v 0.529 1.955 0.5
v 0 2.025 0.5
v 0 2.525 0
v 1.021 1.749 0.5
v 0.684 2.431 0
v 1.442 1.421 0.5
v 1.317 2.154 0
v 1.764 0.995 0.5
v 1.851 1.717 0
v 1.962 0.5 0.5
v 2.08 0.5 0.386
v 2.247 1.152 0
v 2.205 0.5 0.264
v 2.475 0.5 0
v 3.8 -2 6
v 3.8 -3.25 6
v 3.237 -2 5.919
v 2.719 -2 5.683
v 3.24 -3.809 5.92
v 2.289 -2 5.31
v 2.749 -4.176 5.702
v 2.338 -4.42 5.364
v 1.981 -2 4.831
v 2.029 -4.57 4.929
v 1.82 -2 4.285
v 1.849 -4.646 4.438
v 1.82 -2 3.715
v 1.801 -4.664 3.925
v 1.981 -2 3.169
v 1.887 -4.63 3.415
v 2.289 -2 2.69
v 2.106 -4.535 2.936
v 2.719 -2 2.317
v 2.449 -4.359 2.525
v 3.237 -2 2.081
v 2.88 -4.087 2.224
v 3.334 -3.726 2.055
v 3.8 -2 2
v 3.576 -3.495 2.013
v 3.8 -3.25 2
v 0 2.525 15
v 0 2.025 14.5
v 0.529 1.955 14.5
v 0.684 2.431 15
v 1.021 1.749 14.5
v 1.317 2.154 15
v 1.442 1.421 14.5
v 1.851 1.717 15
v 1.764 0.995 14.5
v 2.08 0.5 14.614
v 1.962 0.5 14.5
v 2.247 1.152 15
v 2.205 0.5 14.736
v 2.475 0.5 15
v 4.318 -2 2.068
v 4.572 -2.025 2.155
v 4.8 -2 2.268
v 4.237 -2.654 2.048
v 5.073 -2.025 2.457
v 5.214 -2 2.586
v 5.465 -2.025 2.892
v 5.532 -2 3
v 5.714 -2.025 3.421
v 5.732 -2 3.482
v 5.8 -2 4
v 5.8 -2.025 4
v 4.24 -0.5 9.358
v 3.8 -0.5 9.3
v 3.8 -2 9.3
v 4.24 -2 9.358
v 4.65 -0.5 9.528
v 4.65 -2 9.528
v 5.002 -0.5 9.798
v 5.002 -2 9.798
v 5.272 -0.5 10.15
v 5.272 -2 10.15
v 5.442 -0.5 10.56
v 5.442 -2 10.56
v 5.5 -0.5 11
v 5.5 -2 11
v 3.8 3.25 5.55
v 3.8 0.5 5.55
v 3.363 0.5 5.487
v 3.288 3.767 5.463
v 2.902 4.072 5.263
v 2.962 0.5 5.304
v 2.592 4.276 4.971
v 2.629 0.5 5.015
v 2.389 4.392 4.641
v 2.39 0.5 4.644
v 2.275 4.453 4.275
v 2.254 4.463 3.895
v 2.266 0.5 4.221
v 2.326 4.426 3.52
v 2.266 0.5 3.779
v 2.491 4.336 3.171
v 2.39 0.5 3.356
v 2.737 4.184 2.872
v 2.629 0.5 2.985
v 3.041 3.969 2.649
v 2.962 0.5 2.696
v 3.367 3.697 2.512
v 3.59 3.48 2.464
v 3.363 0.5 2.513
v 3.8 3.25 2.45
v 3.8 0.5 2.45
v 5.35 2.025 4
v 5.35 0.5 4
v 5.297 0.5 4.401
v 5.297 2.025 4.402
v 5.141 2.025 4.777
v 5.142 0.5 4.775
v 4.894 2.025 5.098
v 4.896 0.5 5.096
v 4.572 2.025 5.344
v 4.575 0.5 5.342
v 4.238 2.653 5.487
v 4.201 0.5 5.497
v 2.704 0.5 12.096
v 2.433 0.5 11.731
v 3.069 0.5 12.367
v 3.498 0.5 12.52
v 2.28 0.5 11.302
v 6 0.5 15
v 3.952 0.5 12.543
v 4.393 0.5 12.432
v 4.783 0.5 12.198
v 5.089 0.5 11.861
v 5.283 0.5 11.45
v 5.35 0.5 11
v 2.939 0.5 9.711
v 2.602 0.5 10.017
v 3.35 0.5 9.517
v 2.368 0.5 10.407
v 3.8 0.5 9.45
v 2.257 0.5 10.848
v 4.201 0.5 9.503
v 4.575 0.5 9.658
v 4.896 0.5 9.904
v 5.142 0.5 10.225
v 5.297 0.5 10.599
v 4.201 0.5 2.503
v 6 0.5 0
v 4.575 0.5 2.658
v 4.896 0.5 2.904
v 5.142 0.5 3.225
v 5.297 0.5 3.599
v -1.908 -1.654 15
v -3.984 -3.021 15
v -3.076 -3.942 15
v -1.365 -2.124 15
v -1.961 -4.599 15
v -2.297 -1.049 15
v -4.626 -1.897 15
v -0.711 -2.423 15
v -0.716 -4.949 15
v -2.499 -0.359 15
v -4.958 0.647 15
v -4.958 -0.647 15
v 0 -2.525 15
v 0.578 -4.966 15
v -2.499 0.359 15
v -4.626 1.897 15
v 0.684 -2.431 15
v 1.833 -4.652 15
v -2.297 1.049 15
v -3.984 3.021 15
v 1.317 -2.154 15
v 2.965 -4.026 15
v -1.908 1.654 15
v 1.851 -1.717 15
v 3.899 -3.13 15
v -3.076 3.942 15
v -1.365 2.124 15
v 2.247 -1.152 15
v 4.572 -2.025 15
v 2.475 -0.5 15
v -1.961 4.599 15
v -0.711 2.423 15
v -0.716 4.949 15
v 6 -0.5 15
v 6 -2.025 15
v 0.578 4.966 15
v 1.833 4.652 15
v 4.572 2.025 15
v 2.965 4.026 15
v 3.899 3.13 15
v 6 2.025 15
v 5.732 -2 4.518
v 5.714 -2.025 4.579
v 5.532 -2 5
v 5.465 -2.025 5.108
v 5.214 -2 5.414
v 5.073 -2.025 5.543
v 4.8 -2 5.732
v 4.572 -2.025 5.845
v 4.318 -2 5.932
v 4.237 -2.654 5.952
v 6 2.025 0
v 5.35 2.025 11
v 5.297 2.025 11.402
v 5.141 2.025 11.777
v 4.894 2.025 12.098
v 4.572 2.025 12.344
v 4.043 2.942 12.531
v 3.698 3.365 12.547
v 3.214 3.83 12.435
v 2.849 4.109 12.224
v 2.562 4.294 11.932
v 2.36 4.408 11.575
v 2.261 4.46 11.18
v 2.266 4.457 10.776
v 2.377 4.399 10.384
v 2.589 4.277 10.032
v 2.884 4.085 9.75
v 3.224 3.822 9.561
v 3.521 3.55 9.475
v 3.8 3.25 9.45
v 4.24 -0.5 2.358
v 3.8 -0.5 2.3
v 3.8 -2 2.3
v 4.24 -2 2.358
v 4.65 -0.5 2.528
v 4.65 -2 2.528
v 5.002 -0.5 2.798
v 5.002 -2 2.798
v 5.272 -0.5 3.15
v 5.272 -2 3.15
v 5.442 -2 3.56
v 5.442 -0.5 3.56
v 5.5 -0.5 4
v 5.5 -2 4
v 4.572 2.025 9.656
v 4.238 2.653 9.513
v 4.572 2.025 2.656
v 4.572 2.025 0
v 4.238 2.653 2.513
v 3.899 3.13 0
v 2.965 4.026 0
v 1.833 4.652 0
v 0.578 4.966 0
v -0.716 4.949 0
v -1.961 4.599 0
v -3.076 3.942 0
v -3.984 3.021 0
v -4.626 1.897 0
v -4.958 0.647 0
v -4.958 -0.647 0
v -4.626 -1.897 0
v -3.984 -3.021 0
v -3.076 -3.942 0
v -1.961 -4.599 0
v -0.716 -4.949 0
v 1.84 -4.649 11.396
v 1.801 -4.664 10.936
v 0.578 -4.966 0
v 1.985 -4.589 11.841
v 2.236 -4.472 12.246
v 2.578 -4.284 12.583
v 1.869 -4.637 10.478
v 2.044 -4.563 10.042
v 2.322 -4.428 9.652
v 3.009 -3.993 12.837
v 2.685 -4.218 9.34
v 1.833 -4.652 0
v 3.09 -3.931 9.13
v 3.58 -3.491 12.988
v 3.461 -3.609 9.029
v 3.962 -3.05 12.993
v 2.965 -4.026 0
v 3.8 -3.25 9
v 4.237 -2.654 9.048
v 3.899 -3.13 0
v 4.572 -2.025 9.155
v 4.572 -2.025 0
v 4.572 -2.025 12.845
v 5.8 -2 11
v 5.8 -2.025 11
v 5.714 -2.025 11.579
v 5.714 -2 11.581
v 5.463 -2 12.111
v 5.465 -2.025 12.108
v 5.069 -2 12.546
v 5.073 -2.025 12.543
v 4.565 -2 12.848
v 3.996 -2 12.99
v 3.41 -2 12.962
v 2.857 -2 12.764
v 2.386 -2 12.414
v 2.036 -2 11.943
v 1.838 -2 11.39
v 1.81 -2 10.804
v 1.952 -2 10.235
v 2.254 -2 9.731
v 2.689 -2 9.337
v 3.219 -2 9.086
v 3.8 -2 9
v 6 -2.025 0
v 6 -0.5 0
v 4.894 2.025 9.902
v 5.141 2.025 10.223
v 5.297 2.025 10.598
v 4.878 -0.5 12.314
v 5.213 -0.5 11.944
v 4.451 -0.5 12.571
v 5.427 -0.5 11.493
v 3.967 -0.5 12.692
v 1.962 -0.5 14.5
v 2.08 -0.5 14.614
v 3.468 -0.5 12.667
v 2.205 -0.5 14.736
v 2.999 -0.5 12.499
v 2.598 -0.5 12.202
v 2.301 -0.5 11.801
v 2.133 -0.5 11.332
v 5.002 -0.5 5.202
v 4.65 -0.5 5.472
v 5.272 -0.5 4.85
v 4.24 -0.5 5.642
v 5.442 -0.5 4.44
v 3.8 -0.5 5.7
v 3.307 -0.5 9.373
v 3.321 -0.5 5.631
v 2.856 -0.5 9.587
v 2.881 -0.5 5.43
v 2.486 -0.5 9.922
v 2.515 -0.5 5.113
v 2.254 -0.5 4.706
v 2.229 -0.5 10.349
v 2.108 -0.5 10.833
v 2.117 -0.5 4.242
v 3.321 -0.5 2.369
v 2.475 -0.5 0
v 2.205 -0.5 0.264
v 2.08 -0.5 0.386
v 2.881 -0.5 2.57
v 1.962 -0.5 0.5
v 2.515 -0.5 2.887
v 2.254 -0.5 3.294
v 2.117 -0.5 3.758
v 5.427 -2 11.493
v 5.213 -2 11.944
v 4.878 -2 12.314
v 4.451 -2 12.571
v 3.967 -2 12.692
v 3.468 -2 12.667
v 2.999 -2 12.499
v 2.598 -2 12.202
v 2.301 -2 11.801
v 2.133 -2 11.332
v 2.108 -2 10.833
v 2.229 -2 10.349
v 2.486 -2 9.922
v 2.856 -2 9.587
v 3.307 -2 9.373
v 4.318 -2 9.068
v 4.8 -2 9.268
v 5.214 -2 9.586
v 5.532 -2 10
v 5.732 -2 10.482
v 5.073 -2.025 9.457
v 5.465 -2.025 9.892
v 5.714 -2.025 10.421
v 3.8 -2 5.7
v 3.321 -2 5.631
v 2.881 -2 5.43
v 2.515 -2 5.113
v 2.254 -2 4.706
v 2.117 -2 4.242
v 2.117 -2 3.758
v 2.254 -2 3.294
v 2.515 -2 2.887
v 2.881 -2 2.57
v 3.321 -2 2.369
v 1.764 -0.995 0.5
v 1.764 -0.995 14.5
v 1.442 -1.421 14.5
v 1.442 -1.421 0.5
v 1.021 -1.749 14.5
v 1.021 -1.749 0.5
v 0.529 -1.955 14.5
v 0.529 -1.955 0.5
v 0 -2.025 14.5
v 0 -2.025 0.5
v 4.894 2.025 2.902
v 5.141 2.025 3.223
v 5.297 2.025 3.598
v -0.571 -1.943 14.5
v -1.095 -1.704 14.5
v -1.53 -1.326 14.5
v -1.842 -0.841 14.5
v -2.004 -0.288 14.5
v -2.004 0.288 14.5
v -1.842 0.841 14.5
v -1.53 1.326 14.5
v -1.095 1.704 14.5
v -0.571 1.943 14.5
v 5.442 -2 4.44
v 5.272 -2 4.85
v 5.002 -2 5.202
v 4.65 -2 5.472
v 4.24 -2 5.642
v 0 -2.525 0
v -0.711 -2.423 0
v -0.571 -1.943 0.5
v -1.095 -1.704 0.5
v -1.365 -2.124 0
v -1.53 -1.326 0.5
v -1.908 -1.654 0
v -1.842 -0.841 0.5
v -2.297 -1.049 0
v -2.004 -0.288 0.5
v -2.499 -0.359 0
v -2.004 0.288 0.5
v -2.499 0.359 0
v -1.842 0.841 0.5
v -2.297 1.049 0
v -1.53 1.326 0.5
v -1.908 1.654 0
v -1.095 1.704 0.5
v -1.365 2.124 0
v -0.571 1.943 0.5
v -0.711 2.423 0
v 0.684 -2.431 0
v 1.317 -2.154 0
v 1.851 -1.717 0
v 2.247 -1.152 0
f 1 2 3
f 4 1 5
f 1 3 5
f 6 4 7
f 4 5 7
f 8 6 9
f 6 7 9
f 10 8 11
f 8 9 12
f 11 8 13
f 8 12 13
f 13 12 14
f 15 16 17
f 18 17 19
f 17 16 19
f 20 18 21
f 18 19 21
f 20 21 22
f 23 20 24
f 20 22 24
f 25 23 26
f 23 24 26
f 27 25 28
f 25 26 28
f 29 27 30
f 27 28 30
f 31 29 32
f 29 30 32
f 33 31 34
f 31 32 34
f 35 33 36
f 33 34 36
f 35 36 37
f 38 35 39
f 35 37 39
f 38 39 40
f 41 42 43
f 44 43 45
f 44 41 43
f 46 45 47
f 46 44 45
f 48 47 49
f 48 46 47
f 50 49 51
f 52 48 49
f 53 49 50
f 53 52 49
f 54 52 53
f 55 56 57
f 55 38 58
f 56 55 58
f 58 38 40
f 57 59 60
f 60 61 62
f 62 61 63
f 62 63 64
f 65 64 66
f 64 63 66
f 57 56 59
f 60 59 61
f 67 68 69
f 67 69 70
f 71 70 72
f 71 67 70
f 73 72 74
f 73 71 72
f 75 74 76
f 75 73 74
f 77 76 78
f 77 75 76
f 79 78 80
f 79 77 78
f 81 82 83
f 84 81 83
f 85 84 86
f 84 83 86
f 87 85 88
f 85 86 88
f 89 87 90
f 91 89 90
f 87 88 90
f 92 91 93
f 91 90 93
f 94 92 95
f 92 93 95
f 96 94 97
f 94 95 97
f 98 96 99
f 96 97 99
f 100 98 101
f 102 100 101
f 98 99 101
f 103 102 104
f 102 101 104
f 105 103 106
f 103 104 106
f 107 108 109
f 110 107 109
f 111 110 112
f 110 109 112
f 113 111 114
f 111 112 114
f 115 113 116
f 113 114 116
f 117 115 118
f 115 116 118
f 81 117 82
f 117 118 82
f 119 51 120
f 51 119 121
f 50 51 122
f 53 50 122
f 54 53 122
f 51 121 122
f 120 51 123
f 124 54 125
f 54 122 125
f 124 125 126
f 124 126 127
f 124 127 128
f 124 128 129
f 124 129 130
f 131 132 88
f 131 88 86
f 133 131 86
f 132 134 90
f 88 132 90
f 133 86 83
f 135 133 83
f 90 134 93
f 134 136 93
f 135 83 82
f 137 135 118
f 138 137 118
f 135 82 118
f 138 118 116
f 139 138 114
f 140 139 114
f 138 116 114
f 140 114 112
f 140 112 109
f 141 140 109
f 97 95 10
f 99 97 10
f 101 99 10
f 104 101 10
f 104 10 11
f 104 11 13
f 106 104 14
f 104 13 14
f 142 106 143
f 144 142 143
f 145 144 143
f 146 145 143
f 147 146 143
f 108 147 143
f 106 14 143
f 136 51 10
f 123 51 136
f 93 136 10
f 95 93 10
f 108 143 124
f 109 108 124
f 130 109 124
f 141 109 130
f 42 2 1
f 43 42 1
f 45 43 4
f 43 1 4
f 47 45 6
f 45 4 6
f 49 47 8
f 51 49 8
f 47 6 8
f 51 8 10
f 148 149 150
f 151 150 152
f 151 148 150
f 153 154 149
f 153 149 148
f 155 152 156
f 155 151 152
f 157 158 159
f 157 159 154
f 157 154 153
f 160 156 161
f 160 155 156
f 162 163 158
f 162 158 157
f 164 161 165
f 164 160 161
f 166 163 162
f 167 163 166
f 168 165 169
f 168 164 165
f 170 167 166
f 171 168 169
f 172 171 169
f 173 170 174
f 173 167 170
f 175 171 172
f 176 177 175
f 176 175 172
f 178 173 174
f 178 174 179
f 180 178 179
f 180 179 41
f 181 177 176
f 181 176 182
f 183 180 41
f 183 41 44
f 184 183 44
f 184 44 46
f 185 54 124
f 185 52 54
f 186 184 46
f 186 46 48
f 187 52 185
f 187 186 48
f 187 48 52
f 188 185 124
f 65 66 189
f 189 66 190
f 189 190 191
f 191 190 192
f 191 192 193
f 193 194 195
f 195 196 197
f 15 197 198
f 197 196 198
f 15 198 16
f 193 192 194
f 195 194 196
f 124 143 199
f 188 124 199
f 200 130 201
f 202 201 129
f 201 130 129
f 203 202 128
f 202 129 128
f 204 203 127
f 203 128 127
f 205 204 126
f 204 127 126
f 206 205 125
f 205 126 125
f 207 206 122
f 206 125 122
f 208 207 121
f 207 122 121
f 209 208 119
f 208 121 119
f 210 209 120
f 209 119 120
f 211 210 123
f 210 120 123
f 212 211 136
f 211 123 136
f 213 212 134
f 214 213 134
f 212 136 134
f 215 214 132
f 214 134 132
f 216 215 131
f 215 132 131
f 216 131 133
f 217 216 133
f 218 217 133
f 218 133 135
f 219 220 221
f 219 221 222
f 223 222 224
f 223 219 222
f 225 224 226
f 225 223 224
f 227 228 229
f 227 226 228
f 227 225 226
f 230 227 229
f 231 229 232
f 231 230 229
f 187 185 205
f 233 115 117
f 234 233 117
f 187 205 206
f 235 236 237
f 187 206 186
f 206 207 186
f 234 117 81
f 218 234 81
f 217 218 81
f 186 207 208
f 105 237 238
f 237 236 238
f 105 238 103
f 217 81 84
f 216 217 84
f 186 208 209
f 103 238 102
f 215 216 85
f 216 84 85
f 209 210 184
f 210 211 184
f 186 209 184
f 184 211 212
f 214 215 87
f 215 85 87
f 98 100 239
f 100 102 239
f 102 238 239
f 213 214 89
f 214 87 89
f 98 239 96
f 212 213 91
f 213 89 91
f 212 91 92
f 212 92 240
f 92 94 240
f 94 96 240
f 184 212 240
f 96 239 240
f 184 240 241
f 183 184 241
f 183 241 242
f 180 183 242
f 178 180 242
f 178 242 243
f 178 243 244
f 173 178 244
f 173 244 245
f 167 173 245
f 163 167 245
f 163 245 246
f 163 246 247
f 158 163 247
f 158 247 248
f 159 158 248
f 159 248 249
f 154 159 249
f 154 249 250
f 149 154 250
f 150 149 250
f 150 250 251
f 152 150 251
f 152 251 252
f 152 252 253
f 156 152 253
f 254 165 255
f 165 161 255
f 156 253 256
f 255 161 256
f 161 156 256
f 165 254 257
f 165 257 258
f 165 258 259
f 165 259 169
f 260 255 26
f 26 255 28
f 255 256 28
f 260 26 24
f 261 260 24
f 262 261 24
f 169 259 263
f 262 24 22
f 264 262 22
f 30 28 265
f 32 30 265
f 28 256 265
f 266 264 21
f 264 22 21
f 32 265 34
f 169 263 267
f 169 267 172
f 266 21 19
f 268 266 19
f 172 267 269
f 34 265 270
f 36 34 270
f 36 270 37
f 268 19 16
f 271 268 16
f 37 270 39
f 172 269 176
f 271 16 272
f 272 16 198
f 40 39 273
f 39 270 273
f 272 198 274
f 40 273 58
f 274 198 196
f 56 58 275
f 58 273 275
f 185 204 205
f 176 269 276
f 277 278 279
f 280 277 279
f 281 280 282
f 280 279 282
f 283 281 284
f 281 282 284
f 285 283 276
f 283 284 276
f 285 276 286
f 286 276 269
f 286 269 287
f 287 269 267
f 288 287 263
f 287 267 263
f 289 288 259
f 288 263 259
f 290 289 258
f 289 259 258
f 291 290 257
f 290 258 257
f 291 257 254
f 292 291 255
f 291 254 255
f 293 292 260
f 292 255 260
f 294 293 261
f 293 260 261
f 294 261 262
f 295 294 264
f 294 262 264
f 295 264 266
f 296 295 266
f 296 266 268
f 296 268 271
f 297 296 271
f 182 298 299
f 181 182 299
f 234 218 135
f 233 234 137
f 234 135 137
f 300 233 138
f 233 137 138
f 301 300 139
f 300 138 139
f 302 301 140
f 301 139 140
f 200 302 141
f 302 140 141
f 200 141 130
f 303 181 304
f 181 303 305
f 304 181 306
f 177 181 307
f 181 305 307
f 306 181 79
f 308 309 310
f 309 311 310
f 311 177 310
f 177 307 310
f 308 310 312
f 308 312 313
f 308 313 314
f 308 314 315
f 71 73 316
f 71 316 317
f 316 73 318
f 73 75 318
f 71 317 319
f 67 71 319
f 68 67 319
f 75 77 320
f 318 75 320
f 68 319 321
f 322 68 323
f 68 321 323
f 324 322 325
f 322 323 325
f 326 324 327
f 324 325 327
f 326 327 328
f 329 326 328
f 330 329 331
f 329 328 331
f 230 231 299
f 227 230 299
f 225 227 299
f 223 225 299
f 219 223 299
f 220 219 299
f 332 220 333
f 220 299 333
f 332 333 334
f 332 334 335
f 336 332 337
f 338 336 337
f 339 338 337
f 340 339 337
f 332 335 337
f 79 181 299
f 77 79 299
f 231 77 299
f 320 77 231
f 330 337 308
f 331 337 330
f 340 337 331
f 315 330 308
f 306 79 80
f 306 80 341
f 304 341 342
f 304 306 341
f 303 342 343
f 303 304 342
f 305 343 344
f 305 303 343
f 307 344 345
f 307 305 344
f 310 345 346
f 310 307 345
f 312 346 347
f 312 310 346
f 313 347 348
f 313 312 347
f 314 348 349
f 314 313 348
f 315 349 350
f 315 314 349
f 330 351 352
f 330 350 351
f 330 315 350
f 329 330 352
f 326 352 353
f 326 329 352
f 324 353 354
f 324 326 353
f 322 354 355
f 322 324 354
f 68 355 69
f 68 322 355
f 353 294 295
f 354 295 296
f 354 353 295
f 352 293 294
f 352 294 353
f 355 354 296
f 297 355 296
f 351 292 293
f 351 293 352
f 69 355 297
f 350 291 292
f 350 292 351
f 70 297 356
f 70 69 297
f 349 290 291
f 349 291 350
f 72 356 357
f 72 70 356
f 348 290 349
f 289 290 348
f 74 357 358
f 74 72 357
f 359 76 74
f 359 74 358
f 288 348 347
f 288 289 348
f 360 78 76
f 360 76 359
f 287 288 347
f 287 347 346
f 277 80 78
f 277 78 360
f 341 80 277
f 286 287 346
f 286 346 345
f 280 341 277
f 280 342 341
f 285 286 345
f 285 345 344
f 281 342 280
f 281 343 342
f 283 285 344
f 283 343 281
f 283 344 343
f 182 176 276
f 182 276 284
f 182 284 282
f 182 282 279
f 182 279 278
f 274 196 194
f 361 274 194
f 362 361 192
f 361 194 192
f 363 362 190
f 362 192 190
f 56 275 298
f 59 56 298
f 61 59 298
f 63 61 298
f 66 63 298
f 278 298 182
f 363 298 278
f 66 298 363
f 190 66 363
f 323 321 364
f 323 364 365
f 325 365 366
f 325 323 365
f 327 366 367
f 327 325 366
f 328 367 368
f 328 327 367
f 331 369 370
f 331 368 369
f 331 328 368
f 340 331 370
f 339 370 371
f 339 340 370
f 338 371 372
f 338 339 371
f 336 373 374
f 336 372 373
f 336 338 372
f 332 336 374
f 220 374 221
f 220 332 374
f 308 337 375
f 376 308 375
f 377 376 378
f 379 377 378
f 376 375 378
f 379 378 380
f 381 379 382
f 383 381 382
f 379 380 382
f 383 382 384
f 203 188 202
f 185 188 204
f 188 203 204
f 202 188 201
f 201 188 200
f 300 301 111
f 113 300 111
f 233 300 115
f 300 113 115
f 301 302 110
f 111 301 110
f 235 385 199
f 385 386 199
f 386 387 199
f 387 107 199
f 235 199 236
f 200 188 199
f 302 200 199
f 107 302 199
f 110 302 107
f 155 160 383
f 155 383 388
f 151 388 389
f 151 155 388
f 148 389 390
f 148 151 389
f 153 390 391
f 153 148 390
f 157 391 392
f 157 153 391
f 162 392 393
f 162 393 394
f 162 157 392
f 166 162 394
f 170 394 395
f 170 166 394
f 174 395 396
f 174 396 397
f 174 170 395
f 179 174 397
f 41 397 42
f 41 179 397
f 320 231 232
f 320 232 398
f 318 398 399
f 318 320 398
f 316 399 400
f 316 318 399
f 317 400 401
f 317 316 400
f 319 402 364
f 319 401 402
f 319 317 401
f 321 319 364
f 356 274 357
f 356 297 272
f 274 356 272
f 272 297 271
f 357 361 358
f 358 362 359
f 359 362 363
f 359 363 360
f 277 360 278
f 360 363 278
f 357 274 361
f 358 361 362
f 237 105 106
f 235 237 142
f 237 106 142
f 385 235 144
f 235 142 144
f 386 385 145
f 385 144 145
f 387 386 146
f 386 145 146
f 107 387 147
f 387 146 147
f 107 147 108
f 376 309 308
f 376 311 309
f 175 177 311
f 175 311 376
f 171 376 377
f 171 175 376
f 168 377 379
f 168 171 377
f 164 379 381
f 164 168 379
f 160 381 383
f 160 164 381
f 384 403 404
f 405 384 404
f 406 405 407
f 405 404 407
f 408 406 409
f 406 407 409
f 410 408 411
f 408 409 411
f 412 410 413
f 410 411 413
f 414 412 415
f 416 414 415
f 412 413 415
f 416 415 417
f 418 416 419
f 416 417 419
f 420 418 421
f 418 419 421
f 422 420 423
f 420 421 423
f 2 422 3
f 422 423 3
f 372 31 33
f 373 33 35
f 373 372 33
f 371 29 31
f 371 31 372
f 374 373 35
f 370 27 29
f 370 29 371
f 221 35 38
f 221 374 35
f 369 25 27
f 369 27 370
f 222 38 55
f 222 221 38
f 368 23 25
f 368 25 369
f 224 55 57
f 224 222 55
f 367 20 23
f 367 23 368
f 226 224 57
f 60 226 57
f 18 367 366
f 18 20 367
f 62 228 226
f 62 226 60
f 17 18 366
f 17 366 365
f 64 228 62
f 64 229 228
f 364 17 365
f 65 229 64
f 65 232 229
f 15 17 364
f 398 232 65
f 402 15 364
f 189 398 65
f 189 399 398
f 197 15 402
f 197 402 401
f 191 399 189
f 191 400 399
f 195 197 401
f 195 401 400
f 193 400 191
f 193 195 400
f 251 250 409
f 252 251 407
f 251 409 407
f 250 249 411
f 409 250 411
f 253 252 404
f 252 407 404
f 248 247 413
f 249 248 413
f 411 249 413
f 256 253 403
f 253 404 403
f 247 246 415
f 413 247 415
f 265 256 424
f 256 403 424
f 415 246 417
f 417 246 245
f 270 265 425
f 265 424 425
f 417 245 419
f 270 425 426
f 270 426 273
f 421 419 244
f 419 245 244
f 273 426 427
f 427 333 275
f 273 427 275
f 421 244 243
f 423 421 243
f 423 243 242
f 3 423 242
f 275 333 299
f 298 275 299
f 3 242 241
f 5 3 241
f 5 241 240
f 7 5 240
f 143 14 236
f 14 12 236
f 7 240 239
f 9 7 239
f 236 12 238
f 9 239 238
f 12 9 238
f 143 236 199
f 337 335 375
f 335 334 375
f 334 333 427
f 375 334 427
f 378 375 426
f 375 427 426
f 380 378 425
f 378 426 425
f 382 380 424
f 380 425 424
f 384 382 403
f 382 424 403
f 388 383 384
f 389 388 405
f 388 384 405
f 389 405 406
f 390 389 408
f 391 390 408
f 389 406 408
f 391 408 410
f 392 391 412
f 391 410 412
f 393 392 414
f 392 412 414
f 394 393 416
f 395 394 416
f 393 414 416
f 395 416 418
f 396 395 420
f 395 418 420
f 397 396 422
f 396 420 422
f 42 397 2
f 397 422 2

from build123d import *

# Parameters (mm, degrees)
F2_DEPTH = 15
F3_DEPTH = 5
F4_DEPTH = 5
F7_DEPTH = 3
F8_SIZE  = 0.5


with BuildPart() as f2:
    # F0 (on Top) → F2 (new body)
    with BuildSketch(Plane.XY):
        with BuildLine():
            ThreePointArc((0, -2.025), (-2.025, 0), (0, 2.025))
            Line((0, 2.025), (4.5715834237, 2.025))
            ThreePointArc((4.5715834237, 2.025), (-5, 0), (4.5715834237, -2.025))
            Line((4.5715834237, -2.025), (0, -2.025))
        make_face()
        with BuildLine():
            Line((4.5715834237, 2.025), (0, 2.025))
            ThreePointArc((0, 2.025), (1.2426031144, 1.5989254204), (1.9623009453, 0.5))
            Line((1.9623009453, 0.5), (4.9749371855, 0.5))
            ThreePointArc((4.9749371855, 0.5), (4.8337790791, 1.2785068691), (4.5715834237, 2.025))
        make_face()
        with BuildLine():
            ThreePointArc((1.9623009453, -0.5), (1.2426031144, -1.5989254204), (0, -2.025))
            Line((0, -2.025), (4.5715834237, -2.025))
            ThreePointArc((4.5715834237, -2.025), (4.8337790791, -1.2785068691), (4.9749371855, -0.5))
            Line((4.9749371855, -0.5), (1.9623009453, -0.5))
        make_face()
        with BuildLine():
            Line((6, 2.025), (4.5715834237, 2.025))
            ThreePointArc((4.5715834237, 2.025), (4.8337790791, 1.2785068691), (4.9749371855, 0.5))
            Line((4.9749371855, 0.5), (5.5474806577, 0.5))
            Line((5.5474806577, 0.5), (6, 0.5))
            Line((6, 0.5), (6, 2.025))
        make_face()
        with BuildLine():
            ThreePointArc((4.9749371855, -0.5), (4.8337790791, -1.2785068691), (4.5715834237, -2.025))
            Line((4.5715834237, -2.025), (6, -2.025))
            Line((6, -2.025), (6, -0.5))
            Line((6, -0.5), (5.5474806577, -0.5))
            Line((5.5474806577, -0.5), (4.9749371855, -0.5))
        make_face()
    extrude(amount=F2_DEPTH)

    # F1 (on Front) → F3 (cut)
    with BuildSketch(Plane.XZ):
        with BuildLine():
            ThreePointArc((5.35, 11), (2.7039844892, 12.0960155108), (3.8, 9.45))
            ThreePointArc((3.8, 9.45), (4.8960155108, 9.9039844892), (5.35, 11))
        make_face()
        with BuildLine():
            Line((3.8, 4), (3.8, 2.45))
            ThreePointArc((3.8, 2.45), (4.8960155108, 2.9039844892), (5.35, 4))
            ThreePointArc((5.35, 4), (4.8960155108, 5.0960155108), (3.8, 5.55))
            Line((3.8, 5.55), (3.8, 4))
        make_face()
        with BuildLine():
            ThreePointArc((3.8, 5.55), (2.25, 4), (3.8, 2.45))
            Line((3.8, 2.45), (3.8, 4))
            Line((3.8, 4), (3.8, 5.55))
        make_face()
    extrude(amount=-F3_DEPTH, mode=Mode.SUBTRACT)

    # F1 (on Front) → F4 (cut)
    with BuildSketch(Plane.XZ):
        with BuildLine():
            ThreePointArc((5.5, 11), (2.597918472, 12.202081528), (3.8, 9.3))
            ThreePointArc((3.8, 9.3), (5.002081528, 9.797918472), (5.5, 11))
        make_face()
        with BuildLine():
            ThreePointArc((5.35, 11), (4.8960155108, 9.9039844892), (3.8, 9.45))
            ThreePointArc((3.8, 9.45), (2.7039844892, 12.0960155108), (5.35, 11))
        make_face(mode=Mode.SUBTRACT)
        with BuildLine():
            ThreePointArc((5.35, 11), (2.7039844892, 12.0960155108), (3.8, 9.45))
            ThreePointArc((3.8, 9.45), (4.8960155108, 9.9039844892), (5.35, 11))
        make_face()
        with BuildLine():
            Line((3.8, 4), (3.8, 2.45))
            ThreePointArc((3.8, 2.45), (4.8960155108, 2.9039844892), (5.35, 4))
            ThreePointArc((5.35, 4), (4.8960155108, 5.0960155108), (3.8, 5.55))
            Line((3.8, 5.55), (3.8, 4))
        make_face()
        with BuildLine():
            ThreePointArc((3.8, 5.55), (2.25, 4), (3.8, 2.45))
            Line((3.8, 2.45), (3.8, 4))
            Line((3.8, 4), (3.8, 5.55))
        make_face()
        with BuildLine():
            Line((3.8, 2.45), (3.8, 2.3))
            ThreePointArc((3.8, 2.3), (5.002081528, 2.797918472), (5.5, 4))
            ThreePointArc((5.5, 4), (5.002081528, 5.202081528), (3.8, 5.7))
            Line((3.8, 5.7), (3.8, 5.55))
            ThreePointArc((3.8, 5.55), (4.8960155108, 5.0960155108), (5.35, 4))
            ThreePointArc((5.35, 4), (4.8960155108, 2.9039844892), (3.8, 2.45))
        make_face()
        with BuildLine():
            ThreePointArc((3.8, 5.7), (2.1, 4), (3.8, 2.3))
            Line((3.8, 2.3), (3.8, 2.45))
            ThreePointArc((3.8, 2.45), (2.25, 4), (3.8, 5.55))
            Line((3.8, 5.55), (3.8, 5.7))
        make_face()
    extrude(amount=F4_DEPTH, mode=Mode.SUBTRACT)

    # F6 (on offset) → F7 (cut)
    with BuildSketch(Plane.XZ.offset(5)):
        with BuildLine():
            ThreePointArc((5.8, 11), (2.3857864376, 12.4142135624), (3.8, 9))
            ThreePointArc((3.8, 9), (5.2142135624, 9.5857864376), (5.8, 11))
        make_face()
        with BuildLine():
            ThreePointArc((3.8, 6), (1.8, 4), (3.8, 2))
            Line((3.8, 2), (3.8, 4))
            Line((3.8, 4), (3.8, 6))
        make_face()
        with BuildLine():
            Line((3.8, 4), (3.8, 2))
            ThreePointArc((3.8, 2), (5.2142135624, 2.5857864376), (5.8, 4))
            ThreePointArc((5.8, 4), (5.2142135624, 5.4142135624), (3.8, 6))
            Line((3.8, 6), (3.8, 4))
        make_face()
    extrude(amount=-F7_DEPTH, mode=Mode.SUBTRACT)

    # F8
    f8_edges = [f2.edges().sort_by_distance(p)[0] for p in [
        (-2.025, 0, 15),
        (-2.025, 0, 0),
    ]]
    chamfer(f8_edges, length=F8_SIZE)


solid = f2.part
